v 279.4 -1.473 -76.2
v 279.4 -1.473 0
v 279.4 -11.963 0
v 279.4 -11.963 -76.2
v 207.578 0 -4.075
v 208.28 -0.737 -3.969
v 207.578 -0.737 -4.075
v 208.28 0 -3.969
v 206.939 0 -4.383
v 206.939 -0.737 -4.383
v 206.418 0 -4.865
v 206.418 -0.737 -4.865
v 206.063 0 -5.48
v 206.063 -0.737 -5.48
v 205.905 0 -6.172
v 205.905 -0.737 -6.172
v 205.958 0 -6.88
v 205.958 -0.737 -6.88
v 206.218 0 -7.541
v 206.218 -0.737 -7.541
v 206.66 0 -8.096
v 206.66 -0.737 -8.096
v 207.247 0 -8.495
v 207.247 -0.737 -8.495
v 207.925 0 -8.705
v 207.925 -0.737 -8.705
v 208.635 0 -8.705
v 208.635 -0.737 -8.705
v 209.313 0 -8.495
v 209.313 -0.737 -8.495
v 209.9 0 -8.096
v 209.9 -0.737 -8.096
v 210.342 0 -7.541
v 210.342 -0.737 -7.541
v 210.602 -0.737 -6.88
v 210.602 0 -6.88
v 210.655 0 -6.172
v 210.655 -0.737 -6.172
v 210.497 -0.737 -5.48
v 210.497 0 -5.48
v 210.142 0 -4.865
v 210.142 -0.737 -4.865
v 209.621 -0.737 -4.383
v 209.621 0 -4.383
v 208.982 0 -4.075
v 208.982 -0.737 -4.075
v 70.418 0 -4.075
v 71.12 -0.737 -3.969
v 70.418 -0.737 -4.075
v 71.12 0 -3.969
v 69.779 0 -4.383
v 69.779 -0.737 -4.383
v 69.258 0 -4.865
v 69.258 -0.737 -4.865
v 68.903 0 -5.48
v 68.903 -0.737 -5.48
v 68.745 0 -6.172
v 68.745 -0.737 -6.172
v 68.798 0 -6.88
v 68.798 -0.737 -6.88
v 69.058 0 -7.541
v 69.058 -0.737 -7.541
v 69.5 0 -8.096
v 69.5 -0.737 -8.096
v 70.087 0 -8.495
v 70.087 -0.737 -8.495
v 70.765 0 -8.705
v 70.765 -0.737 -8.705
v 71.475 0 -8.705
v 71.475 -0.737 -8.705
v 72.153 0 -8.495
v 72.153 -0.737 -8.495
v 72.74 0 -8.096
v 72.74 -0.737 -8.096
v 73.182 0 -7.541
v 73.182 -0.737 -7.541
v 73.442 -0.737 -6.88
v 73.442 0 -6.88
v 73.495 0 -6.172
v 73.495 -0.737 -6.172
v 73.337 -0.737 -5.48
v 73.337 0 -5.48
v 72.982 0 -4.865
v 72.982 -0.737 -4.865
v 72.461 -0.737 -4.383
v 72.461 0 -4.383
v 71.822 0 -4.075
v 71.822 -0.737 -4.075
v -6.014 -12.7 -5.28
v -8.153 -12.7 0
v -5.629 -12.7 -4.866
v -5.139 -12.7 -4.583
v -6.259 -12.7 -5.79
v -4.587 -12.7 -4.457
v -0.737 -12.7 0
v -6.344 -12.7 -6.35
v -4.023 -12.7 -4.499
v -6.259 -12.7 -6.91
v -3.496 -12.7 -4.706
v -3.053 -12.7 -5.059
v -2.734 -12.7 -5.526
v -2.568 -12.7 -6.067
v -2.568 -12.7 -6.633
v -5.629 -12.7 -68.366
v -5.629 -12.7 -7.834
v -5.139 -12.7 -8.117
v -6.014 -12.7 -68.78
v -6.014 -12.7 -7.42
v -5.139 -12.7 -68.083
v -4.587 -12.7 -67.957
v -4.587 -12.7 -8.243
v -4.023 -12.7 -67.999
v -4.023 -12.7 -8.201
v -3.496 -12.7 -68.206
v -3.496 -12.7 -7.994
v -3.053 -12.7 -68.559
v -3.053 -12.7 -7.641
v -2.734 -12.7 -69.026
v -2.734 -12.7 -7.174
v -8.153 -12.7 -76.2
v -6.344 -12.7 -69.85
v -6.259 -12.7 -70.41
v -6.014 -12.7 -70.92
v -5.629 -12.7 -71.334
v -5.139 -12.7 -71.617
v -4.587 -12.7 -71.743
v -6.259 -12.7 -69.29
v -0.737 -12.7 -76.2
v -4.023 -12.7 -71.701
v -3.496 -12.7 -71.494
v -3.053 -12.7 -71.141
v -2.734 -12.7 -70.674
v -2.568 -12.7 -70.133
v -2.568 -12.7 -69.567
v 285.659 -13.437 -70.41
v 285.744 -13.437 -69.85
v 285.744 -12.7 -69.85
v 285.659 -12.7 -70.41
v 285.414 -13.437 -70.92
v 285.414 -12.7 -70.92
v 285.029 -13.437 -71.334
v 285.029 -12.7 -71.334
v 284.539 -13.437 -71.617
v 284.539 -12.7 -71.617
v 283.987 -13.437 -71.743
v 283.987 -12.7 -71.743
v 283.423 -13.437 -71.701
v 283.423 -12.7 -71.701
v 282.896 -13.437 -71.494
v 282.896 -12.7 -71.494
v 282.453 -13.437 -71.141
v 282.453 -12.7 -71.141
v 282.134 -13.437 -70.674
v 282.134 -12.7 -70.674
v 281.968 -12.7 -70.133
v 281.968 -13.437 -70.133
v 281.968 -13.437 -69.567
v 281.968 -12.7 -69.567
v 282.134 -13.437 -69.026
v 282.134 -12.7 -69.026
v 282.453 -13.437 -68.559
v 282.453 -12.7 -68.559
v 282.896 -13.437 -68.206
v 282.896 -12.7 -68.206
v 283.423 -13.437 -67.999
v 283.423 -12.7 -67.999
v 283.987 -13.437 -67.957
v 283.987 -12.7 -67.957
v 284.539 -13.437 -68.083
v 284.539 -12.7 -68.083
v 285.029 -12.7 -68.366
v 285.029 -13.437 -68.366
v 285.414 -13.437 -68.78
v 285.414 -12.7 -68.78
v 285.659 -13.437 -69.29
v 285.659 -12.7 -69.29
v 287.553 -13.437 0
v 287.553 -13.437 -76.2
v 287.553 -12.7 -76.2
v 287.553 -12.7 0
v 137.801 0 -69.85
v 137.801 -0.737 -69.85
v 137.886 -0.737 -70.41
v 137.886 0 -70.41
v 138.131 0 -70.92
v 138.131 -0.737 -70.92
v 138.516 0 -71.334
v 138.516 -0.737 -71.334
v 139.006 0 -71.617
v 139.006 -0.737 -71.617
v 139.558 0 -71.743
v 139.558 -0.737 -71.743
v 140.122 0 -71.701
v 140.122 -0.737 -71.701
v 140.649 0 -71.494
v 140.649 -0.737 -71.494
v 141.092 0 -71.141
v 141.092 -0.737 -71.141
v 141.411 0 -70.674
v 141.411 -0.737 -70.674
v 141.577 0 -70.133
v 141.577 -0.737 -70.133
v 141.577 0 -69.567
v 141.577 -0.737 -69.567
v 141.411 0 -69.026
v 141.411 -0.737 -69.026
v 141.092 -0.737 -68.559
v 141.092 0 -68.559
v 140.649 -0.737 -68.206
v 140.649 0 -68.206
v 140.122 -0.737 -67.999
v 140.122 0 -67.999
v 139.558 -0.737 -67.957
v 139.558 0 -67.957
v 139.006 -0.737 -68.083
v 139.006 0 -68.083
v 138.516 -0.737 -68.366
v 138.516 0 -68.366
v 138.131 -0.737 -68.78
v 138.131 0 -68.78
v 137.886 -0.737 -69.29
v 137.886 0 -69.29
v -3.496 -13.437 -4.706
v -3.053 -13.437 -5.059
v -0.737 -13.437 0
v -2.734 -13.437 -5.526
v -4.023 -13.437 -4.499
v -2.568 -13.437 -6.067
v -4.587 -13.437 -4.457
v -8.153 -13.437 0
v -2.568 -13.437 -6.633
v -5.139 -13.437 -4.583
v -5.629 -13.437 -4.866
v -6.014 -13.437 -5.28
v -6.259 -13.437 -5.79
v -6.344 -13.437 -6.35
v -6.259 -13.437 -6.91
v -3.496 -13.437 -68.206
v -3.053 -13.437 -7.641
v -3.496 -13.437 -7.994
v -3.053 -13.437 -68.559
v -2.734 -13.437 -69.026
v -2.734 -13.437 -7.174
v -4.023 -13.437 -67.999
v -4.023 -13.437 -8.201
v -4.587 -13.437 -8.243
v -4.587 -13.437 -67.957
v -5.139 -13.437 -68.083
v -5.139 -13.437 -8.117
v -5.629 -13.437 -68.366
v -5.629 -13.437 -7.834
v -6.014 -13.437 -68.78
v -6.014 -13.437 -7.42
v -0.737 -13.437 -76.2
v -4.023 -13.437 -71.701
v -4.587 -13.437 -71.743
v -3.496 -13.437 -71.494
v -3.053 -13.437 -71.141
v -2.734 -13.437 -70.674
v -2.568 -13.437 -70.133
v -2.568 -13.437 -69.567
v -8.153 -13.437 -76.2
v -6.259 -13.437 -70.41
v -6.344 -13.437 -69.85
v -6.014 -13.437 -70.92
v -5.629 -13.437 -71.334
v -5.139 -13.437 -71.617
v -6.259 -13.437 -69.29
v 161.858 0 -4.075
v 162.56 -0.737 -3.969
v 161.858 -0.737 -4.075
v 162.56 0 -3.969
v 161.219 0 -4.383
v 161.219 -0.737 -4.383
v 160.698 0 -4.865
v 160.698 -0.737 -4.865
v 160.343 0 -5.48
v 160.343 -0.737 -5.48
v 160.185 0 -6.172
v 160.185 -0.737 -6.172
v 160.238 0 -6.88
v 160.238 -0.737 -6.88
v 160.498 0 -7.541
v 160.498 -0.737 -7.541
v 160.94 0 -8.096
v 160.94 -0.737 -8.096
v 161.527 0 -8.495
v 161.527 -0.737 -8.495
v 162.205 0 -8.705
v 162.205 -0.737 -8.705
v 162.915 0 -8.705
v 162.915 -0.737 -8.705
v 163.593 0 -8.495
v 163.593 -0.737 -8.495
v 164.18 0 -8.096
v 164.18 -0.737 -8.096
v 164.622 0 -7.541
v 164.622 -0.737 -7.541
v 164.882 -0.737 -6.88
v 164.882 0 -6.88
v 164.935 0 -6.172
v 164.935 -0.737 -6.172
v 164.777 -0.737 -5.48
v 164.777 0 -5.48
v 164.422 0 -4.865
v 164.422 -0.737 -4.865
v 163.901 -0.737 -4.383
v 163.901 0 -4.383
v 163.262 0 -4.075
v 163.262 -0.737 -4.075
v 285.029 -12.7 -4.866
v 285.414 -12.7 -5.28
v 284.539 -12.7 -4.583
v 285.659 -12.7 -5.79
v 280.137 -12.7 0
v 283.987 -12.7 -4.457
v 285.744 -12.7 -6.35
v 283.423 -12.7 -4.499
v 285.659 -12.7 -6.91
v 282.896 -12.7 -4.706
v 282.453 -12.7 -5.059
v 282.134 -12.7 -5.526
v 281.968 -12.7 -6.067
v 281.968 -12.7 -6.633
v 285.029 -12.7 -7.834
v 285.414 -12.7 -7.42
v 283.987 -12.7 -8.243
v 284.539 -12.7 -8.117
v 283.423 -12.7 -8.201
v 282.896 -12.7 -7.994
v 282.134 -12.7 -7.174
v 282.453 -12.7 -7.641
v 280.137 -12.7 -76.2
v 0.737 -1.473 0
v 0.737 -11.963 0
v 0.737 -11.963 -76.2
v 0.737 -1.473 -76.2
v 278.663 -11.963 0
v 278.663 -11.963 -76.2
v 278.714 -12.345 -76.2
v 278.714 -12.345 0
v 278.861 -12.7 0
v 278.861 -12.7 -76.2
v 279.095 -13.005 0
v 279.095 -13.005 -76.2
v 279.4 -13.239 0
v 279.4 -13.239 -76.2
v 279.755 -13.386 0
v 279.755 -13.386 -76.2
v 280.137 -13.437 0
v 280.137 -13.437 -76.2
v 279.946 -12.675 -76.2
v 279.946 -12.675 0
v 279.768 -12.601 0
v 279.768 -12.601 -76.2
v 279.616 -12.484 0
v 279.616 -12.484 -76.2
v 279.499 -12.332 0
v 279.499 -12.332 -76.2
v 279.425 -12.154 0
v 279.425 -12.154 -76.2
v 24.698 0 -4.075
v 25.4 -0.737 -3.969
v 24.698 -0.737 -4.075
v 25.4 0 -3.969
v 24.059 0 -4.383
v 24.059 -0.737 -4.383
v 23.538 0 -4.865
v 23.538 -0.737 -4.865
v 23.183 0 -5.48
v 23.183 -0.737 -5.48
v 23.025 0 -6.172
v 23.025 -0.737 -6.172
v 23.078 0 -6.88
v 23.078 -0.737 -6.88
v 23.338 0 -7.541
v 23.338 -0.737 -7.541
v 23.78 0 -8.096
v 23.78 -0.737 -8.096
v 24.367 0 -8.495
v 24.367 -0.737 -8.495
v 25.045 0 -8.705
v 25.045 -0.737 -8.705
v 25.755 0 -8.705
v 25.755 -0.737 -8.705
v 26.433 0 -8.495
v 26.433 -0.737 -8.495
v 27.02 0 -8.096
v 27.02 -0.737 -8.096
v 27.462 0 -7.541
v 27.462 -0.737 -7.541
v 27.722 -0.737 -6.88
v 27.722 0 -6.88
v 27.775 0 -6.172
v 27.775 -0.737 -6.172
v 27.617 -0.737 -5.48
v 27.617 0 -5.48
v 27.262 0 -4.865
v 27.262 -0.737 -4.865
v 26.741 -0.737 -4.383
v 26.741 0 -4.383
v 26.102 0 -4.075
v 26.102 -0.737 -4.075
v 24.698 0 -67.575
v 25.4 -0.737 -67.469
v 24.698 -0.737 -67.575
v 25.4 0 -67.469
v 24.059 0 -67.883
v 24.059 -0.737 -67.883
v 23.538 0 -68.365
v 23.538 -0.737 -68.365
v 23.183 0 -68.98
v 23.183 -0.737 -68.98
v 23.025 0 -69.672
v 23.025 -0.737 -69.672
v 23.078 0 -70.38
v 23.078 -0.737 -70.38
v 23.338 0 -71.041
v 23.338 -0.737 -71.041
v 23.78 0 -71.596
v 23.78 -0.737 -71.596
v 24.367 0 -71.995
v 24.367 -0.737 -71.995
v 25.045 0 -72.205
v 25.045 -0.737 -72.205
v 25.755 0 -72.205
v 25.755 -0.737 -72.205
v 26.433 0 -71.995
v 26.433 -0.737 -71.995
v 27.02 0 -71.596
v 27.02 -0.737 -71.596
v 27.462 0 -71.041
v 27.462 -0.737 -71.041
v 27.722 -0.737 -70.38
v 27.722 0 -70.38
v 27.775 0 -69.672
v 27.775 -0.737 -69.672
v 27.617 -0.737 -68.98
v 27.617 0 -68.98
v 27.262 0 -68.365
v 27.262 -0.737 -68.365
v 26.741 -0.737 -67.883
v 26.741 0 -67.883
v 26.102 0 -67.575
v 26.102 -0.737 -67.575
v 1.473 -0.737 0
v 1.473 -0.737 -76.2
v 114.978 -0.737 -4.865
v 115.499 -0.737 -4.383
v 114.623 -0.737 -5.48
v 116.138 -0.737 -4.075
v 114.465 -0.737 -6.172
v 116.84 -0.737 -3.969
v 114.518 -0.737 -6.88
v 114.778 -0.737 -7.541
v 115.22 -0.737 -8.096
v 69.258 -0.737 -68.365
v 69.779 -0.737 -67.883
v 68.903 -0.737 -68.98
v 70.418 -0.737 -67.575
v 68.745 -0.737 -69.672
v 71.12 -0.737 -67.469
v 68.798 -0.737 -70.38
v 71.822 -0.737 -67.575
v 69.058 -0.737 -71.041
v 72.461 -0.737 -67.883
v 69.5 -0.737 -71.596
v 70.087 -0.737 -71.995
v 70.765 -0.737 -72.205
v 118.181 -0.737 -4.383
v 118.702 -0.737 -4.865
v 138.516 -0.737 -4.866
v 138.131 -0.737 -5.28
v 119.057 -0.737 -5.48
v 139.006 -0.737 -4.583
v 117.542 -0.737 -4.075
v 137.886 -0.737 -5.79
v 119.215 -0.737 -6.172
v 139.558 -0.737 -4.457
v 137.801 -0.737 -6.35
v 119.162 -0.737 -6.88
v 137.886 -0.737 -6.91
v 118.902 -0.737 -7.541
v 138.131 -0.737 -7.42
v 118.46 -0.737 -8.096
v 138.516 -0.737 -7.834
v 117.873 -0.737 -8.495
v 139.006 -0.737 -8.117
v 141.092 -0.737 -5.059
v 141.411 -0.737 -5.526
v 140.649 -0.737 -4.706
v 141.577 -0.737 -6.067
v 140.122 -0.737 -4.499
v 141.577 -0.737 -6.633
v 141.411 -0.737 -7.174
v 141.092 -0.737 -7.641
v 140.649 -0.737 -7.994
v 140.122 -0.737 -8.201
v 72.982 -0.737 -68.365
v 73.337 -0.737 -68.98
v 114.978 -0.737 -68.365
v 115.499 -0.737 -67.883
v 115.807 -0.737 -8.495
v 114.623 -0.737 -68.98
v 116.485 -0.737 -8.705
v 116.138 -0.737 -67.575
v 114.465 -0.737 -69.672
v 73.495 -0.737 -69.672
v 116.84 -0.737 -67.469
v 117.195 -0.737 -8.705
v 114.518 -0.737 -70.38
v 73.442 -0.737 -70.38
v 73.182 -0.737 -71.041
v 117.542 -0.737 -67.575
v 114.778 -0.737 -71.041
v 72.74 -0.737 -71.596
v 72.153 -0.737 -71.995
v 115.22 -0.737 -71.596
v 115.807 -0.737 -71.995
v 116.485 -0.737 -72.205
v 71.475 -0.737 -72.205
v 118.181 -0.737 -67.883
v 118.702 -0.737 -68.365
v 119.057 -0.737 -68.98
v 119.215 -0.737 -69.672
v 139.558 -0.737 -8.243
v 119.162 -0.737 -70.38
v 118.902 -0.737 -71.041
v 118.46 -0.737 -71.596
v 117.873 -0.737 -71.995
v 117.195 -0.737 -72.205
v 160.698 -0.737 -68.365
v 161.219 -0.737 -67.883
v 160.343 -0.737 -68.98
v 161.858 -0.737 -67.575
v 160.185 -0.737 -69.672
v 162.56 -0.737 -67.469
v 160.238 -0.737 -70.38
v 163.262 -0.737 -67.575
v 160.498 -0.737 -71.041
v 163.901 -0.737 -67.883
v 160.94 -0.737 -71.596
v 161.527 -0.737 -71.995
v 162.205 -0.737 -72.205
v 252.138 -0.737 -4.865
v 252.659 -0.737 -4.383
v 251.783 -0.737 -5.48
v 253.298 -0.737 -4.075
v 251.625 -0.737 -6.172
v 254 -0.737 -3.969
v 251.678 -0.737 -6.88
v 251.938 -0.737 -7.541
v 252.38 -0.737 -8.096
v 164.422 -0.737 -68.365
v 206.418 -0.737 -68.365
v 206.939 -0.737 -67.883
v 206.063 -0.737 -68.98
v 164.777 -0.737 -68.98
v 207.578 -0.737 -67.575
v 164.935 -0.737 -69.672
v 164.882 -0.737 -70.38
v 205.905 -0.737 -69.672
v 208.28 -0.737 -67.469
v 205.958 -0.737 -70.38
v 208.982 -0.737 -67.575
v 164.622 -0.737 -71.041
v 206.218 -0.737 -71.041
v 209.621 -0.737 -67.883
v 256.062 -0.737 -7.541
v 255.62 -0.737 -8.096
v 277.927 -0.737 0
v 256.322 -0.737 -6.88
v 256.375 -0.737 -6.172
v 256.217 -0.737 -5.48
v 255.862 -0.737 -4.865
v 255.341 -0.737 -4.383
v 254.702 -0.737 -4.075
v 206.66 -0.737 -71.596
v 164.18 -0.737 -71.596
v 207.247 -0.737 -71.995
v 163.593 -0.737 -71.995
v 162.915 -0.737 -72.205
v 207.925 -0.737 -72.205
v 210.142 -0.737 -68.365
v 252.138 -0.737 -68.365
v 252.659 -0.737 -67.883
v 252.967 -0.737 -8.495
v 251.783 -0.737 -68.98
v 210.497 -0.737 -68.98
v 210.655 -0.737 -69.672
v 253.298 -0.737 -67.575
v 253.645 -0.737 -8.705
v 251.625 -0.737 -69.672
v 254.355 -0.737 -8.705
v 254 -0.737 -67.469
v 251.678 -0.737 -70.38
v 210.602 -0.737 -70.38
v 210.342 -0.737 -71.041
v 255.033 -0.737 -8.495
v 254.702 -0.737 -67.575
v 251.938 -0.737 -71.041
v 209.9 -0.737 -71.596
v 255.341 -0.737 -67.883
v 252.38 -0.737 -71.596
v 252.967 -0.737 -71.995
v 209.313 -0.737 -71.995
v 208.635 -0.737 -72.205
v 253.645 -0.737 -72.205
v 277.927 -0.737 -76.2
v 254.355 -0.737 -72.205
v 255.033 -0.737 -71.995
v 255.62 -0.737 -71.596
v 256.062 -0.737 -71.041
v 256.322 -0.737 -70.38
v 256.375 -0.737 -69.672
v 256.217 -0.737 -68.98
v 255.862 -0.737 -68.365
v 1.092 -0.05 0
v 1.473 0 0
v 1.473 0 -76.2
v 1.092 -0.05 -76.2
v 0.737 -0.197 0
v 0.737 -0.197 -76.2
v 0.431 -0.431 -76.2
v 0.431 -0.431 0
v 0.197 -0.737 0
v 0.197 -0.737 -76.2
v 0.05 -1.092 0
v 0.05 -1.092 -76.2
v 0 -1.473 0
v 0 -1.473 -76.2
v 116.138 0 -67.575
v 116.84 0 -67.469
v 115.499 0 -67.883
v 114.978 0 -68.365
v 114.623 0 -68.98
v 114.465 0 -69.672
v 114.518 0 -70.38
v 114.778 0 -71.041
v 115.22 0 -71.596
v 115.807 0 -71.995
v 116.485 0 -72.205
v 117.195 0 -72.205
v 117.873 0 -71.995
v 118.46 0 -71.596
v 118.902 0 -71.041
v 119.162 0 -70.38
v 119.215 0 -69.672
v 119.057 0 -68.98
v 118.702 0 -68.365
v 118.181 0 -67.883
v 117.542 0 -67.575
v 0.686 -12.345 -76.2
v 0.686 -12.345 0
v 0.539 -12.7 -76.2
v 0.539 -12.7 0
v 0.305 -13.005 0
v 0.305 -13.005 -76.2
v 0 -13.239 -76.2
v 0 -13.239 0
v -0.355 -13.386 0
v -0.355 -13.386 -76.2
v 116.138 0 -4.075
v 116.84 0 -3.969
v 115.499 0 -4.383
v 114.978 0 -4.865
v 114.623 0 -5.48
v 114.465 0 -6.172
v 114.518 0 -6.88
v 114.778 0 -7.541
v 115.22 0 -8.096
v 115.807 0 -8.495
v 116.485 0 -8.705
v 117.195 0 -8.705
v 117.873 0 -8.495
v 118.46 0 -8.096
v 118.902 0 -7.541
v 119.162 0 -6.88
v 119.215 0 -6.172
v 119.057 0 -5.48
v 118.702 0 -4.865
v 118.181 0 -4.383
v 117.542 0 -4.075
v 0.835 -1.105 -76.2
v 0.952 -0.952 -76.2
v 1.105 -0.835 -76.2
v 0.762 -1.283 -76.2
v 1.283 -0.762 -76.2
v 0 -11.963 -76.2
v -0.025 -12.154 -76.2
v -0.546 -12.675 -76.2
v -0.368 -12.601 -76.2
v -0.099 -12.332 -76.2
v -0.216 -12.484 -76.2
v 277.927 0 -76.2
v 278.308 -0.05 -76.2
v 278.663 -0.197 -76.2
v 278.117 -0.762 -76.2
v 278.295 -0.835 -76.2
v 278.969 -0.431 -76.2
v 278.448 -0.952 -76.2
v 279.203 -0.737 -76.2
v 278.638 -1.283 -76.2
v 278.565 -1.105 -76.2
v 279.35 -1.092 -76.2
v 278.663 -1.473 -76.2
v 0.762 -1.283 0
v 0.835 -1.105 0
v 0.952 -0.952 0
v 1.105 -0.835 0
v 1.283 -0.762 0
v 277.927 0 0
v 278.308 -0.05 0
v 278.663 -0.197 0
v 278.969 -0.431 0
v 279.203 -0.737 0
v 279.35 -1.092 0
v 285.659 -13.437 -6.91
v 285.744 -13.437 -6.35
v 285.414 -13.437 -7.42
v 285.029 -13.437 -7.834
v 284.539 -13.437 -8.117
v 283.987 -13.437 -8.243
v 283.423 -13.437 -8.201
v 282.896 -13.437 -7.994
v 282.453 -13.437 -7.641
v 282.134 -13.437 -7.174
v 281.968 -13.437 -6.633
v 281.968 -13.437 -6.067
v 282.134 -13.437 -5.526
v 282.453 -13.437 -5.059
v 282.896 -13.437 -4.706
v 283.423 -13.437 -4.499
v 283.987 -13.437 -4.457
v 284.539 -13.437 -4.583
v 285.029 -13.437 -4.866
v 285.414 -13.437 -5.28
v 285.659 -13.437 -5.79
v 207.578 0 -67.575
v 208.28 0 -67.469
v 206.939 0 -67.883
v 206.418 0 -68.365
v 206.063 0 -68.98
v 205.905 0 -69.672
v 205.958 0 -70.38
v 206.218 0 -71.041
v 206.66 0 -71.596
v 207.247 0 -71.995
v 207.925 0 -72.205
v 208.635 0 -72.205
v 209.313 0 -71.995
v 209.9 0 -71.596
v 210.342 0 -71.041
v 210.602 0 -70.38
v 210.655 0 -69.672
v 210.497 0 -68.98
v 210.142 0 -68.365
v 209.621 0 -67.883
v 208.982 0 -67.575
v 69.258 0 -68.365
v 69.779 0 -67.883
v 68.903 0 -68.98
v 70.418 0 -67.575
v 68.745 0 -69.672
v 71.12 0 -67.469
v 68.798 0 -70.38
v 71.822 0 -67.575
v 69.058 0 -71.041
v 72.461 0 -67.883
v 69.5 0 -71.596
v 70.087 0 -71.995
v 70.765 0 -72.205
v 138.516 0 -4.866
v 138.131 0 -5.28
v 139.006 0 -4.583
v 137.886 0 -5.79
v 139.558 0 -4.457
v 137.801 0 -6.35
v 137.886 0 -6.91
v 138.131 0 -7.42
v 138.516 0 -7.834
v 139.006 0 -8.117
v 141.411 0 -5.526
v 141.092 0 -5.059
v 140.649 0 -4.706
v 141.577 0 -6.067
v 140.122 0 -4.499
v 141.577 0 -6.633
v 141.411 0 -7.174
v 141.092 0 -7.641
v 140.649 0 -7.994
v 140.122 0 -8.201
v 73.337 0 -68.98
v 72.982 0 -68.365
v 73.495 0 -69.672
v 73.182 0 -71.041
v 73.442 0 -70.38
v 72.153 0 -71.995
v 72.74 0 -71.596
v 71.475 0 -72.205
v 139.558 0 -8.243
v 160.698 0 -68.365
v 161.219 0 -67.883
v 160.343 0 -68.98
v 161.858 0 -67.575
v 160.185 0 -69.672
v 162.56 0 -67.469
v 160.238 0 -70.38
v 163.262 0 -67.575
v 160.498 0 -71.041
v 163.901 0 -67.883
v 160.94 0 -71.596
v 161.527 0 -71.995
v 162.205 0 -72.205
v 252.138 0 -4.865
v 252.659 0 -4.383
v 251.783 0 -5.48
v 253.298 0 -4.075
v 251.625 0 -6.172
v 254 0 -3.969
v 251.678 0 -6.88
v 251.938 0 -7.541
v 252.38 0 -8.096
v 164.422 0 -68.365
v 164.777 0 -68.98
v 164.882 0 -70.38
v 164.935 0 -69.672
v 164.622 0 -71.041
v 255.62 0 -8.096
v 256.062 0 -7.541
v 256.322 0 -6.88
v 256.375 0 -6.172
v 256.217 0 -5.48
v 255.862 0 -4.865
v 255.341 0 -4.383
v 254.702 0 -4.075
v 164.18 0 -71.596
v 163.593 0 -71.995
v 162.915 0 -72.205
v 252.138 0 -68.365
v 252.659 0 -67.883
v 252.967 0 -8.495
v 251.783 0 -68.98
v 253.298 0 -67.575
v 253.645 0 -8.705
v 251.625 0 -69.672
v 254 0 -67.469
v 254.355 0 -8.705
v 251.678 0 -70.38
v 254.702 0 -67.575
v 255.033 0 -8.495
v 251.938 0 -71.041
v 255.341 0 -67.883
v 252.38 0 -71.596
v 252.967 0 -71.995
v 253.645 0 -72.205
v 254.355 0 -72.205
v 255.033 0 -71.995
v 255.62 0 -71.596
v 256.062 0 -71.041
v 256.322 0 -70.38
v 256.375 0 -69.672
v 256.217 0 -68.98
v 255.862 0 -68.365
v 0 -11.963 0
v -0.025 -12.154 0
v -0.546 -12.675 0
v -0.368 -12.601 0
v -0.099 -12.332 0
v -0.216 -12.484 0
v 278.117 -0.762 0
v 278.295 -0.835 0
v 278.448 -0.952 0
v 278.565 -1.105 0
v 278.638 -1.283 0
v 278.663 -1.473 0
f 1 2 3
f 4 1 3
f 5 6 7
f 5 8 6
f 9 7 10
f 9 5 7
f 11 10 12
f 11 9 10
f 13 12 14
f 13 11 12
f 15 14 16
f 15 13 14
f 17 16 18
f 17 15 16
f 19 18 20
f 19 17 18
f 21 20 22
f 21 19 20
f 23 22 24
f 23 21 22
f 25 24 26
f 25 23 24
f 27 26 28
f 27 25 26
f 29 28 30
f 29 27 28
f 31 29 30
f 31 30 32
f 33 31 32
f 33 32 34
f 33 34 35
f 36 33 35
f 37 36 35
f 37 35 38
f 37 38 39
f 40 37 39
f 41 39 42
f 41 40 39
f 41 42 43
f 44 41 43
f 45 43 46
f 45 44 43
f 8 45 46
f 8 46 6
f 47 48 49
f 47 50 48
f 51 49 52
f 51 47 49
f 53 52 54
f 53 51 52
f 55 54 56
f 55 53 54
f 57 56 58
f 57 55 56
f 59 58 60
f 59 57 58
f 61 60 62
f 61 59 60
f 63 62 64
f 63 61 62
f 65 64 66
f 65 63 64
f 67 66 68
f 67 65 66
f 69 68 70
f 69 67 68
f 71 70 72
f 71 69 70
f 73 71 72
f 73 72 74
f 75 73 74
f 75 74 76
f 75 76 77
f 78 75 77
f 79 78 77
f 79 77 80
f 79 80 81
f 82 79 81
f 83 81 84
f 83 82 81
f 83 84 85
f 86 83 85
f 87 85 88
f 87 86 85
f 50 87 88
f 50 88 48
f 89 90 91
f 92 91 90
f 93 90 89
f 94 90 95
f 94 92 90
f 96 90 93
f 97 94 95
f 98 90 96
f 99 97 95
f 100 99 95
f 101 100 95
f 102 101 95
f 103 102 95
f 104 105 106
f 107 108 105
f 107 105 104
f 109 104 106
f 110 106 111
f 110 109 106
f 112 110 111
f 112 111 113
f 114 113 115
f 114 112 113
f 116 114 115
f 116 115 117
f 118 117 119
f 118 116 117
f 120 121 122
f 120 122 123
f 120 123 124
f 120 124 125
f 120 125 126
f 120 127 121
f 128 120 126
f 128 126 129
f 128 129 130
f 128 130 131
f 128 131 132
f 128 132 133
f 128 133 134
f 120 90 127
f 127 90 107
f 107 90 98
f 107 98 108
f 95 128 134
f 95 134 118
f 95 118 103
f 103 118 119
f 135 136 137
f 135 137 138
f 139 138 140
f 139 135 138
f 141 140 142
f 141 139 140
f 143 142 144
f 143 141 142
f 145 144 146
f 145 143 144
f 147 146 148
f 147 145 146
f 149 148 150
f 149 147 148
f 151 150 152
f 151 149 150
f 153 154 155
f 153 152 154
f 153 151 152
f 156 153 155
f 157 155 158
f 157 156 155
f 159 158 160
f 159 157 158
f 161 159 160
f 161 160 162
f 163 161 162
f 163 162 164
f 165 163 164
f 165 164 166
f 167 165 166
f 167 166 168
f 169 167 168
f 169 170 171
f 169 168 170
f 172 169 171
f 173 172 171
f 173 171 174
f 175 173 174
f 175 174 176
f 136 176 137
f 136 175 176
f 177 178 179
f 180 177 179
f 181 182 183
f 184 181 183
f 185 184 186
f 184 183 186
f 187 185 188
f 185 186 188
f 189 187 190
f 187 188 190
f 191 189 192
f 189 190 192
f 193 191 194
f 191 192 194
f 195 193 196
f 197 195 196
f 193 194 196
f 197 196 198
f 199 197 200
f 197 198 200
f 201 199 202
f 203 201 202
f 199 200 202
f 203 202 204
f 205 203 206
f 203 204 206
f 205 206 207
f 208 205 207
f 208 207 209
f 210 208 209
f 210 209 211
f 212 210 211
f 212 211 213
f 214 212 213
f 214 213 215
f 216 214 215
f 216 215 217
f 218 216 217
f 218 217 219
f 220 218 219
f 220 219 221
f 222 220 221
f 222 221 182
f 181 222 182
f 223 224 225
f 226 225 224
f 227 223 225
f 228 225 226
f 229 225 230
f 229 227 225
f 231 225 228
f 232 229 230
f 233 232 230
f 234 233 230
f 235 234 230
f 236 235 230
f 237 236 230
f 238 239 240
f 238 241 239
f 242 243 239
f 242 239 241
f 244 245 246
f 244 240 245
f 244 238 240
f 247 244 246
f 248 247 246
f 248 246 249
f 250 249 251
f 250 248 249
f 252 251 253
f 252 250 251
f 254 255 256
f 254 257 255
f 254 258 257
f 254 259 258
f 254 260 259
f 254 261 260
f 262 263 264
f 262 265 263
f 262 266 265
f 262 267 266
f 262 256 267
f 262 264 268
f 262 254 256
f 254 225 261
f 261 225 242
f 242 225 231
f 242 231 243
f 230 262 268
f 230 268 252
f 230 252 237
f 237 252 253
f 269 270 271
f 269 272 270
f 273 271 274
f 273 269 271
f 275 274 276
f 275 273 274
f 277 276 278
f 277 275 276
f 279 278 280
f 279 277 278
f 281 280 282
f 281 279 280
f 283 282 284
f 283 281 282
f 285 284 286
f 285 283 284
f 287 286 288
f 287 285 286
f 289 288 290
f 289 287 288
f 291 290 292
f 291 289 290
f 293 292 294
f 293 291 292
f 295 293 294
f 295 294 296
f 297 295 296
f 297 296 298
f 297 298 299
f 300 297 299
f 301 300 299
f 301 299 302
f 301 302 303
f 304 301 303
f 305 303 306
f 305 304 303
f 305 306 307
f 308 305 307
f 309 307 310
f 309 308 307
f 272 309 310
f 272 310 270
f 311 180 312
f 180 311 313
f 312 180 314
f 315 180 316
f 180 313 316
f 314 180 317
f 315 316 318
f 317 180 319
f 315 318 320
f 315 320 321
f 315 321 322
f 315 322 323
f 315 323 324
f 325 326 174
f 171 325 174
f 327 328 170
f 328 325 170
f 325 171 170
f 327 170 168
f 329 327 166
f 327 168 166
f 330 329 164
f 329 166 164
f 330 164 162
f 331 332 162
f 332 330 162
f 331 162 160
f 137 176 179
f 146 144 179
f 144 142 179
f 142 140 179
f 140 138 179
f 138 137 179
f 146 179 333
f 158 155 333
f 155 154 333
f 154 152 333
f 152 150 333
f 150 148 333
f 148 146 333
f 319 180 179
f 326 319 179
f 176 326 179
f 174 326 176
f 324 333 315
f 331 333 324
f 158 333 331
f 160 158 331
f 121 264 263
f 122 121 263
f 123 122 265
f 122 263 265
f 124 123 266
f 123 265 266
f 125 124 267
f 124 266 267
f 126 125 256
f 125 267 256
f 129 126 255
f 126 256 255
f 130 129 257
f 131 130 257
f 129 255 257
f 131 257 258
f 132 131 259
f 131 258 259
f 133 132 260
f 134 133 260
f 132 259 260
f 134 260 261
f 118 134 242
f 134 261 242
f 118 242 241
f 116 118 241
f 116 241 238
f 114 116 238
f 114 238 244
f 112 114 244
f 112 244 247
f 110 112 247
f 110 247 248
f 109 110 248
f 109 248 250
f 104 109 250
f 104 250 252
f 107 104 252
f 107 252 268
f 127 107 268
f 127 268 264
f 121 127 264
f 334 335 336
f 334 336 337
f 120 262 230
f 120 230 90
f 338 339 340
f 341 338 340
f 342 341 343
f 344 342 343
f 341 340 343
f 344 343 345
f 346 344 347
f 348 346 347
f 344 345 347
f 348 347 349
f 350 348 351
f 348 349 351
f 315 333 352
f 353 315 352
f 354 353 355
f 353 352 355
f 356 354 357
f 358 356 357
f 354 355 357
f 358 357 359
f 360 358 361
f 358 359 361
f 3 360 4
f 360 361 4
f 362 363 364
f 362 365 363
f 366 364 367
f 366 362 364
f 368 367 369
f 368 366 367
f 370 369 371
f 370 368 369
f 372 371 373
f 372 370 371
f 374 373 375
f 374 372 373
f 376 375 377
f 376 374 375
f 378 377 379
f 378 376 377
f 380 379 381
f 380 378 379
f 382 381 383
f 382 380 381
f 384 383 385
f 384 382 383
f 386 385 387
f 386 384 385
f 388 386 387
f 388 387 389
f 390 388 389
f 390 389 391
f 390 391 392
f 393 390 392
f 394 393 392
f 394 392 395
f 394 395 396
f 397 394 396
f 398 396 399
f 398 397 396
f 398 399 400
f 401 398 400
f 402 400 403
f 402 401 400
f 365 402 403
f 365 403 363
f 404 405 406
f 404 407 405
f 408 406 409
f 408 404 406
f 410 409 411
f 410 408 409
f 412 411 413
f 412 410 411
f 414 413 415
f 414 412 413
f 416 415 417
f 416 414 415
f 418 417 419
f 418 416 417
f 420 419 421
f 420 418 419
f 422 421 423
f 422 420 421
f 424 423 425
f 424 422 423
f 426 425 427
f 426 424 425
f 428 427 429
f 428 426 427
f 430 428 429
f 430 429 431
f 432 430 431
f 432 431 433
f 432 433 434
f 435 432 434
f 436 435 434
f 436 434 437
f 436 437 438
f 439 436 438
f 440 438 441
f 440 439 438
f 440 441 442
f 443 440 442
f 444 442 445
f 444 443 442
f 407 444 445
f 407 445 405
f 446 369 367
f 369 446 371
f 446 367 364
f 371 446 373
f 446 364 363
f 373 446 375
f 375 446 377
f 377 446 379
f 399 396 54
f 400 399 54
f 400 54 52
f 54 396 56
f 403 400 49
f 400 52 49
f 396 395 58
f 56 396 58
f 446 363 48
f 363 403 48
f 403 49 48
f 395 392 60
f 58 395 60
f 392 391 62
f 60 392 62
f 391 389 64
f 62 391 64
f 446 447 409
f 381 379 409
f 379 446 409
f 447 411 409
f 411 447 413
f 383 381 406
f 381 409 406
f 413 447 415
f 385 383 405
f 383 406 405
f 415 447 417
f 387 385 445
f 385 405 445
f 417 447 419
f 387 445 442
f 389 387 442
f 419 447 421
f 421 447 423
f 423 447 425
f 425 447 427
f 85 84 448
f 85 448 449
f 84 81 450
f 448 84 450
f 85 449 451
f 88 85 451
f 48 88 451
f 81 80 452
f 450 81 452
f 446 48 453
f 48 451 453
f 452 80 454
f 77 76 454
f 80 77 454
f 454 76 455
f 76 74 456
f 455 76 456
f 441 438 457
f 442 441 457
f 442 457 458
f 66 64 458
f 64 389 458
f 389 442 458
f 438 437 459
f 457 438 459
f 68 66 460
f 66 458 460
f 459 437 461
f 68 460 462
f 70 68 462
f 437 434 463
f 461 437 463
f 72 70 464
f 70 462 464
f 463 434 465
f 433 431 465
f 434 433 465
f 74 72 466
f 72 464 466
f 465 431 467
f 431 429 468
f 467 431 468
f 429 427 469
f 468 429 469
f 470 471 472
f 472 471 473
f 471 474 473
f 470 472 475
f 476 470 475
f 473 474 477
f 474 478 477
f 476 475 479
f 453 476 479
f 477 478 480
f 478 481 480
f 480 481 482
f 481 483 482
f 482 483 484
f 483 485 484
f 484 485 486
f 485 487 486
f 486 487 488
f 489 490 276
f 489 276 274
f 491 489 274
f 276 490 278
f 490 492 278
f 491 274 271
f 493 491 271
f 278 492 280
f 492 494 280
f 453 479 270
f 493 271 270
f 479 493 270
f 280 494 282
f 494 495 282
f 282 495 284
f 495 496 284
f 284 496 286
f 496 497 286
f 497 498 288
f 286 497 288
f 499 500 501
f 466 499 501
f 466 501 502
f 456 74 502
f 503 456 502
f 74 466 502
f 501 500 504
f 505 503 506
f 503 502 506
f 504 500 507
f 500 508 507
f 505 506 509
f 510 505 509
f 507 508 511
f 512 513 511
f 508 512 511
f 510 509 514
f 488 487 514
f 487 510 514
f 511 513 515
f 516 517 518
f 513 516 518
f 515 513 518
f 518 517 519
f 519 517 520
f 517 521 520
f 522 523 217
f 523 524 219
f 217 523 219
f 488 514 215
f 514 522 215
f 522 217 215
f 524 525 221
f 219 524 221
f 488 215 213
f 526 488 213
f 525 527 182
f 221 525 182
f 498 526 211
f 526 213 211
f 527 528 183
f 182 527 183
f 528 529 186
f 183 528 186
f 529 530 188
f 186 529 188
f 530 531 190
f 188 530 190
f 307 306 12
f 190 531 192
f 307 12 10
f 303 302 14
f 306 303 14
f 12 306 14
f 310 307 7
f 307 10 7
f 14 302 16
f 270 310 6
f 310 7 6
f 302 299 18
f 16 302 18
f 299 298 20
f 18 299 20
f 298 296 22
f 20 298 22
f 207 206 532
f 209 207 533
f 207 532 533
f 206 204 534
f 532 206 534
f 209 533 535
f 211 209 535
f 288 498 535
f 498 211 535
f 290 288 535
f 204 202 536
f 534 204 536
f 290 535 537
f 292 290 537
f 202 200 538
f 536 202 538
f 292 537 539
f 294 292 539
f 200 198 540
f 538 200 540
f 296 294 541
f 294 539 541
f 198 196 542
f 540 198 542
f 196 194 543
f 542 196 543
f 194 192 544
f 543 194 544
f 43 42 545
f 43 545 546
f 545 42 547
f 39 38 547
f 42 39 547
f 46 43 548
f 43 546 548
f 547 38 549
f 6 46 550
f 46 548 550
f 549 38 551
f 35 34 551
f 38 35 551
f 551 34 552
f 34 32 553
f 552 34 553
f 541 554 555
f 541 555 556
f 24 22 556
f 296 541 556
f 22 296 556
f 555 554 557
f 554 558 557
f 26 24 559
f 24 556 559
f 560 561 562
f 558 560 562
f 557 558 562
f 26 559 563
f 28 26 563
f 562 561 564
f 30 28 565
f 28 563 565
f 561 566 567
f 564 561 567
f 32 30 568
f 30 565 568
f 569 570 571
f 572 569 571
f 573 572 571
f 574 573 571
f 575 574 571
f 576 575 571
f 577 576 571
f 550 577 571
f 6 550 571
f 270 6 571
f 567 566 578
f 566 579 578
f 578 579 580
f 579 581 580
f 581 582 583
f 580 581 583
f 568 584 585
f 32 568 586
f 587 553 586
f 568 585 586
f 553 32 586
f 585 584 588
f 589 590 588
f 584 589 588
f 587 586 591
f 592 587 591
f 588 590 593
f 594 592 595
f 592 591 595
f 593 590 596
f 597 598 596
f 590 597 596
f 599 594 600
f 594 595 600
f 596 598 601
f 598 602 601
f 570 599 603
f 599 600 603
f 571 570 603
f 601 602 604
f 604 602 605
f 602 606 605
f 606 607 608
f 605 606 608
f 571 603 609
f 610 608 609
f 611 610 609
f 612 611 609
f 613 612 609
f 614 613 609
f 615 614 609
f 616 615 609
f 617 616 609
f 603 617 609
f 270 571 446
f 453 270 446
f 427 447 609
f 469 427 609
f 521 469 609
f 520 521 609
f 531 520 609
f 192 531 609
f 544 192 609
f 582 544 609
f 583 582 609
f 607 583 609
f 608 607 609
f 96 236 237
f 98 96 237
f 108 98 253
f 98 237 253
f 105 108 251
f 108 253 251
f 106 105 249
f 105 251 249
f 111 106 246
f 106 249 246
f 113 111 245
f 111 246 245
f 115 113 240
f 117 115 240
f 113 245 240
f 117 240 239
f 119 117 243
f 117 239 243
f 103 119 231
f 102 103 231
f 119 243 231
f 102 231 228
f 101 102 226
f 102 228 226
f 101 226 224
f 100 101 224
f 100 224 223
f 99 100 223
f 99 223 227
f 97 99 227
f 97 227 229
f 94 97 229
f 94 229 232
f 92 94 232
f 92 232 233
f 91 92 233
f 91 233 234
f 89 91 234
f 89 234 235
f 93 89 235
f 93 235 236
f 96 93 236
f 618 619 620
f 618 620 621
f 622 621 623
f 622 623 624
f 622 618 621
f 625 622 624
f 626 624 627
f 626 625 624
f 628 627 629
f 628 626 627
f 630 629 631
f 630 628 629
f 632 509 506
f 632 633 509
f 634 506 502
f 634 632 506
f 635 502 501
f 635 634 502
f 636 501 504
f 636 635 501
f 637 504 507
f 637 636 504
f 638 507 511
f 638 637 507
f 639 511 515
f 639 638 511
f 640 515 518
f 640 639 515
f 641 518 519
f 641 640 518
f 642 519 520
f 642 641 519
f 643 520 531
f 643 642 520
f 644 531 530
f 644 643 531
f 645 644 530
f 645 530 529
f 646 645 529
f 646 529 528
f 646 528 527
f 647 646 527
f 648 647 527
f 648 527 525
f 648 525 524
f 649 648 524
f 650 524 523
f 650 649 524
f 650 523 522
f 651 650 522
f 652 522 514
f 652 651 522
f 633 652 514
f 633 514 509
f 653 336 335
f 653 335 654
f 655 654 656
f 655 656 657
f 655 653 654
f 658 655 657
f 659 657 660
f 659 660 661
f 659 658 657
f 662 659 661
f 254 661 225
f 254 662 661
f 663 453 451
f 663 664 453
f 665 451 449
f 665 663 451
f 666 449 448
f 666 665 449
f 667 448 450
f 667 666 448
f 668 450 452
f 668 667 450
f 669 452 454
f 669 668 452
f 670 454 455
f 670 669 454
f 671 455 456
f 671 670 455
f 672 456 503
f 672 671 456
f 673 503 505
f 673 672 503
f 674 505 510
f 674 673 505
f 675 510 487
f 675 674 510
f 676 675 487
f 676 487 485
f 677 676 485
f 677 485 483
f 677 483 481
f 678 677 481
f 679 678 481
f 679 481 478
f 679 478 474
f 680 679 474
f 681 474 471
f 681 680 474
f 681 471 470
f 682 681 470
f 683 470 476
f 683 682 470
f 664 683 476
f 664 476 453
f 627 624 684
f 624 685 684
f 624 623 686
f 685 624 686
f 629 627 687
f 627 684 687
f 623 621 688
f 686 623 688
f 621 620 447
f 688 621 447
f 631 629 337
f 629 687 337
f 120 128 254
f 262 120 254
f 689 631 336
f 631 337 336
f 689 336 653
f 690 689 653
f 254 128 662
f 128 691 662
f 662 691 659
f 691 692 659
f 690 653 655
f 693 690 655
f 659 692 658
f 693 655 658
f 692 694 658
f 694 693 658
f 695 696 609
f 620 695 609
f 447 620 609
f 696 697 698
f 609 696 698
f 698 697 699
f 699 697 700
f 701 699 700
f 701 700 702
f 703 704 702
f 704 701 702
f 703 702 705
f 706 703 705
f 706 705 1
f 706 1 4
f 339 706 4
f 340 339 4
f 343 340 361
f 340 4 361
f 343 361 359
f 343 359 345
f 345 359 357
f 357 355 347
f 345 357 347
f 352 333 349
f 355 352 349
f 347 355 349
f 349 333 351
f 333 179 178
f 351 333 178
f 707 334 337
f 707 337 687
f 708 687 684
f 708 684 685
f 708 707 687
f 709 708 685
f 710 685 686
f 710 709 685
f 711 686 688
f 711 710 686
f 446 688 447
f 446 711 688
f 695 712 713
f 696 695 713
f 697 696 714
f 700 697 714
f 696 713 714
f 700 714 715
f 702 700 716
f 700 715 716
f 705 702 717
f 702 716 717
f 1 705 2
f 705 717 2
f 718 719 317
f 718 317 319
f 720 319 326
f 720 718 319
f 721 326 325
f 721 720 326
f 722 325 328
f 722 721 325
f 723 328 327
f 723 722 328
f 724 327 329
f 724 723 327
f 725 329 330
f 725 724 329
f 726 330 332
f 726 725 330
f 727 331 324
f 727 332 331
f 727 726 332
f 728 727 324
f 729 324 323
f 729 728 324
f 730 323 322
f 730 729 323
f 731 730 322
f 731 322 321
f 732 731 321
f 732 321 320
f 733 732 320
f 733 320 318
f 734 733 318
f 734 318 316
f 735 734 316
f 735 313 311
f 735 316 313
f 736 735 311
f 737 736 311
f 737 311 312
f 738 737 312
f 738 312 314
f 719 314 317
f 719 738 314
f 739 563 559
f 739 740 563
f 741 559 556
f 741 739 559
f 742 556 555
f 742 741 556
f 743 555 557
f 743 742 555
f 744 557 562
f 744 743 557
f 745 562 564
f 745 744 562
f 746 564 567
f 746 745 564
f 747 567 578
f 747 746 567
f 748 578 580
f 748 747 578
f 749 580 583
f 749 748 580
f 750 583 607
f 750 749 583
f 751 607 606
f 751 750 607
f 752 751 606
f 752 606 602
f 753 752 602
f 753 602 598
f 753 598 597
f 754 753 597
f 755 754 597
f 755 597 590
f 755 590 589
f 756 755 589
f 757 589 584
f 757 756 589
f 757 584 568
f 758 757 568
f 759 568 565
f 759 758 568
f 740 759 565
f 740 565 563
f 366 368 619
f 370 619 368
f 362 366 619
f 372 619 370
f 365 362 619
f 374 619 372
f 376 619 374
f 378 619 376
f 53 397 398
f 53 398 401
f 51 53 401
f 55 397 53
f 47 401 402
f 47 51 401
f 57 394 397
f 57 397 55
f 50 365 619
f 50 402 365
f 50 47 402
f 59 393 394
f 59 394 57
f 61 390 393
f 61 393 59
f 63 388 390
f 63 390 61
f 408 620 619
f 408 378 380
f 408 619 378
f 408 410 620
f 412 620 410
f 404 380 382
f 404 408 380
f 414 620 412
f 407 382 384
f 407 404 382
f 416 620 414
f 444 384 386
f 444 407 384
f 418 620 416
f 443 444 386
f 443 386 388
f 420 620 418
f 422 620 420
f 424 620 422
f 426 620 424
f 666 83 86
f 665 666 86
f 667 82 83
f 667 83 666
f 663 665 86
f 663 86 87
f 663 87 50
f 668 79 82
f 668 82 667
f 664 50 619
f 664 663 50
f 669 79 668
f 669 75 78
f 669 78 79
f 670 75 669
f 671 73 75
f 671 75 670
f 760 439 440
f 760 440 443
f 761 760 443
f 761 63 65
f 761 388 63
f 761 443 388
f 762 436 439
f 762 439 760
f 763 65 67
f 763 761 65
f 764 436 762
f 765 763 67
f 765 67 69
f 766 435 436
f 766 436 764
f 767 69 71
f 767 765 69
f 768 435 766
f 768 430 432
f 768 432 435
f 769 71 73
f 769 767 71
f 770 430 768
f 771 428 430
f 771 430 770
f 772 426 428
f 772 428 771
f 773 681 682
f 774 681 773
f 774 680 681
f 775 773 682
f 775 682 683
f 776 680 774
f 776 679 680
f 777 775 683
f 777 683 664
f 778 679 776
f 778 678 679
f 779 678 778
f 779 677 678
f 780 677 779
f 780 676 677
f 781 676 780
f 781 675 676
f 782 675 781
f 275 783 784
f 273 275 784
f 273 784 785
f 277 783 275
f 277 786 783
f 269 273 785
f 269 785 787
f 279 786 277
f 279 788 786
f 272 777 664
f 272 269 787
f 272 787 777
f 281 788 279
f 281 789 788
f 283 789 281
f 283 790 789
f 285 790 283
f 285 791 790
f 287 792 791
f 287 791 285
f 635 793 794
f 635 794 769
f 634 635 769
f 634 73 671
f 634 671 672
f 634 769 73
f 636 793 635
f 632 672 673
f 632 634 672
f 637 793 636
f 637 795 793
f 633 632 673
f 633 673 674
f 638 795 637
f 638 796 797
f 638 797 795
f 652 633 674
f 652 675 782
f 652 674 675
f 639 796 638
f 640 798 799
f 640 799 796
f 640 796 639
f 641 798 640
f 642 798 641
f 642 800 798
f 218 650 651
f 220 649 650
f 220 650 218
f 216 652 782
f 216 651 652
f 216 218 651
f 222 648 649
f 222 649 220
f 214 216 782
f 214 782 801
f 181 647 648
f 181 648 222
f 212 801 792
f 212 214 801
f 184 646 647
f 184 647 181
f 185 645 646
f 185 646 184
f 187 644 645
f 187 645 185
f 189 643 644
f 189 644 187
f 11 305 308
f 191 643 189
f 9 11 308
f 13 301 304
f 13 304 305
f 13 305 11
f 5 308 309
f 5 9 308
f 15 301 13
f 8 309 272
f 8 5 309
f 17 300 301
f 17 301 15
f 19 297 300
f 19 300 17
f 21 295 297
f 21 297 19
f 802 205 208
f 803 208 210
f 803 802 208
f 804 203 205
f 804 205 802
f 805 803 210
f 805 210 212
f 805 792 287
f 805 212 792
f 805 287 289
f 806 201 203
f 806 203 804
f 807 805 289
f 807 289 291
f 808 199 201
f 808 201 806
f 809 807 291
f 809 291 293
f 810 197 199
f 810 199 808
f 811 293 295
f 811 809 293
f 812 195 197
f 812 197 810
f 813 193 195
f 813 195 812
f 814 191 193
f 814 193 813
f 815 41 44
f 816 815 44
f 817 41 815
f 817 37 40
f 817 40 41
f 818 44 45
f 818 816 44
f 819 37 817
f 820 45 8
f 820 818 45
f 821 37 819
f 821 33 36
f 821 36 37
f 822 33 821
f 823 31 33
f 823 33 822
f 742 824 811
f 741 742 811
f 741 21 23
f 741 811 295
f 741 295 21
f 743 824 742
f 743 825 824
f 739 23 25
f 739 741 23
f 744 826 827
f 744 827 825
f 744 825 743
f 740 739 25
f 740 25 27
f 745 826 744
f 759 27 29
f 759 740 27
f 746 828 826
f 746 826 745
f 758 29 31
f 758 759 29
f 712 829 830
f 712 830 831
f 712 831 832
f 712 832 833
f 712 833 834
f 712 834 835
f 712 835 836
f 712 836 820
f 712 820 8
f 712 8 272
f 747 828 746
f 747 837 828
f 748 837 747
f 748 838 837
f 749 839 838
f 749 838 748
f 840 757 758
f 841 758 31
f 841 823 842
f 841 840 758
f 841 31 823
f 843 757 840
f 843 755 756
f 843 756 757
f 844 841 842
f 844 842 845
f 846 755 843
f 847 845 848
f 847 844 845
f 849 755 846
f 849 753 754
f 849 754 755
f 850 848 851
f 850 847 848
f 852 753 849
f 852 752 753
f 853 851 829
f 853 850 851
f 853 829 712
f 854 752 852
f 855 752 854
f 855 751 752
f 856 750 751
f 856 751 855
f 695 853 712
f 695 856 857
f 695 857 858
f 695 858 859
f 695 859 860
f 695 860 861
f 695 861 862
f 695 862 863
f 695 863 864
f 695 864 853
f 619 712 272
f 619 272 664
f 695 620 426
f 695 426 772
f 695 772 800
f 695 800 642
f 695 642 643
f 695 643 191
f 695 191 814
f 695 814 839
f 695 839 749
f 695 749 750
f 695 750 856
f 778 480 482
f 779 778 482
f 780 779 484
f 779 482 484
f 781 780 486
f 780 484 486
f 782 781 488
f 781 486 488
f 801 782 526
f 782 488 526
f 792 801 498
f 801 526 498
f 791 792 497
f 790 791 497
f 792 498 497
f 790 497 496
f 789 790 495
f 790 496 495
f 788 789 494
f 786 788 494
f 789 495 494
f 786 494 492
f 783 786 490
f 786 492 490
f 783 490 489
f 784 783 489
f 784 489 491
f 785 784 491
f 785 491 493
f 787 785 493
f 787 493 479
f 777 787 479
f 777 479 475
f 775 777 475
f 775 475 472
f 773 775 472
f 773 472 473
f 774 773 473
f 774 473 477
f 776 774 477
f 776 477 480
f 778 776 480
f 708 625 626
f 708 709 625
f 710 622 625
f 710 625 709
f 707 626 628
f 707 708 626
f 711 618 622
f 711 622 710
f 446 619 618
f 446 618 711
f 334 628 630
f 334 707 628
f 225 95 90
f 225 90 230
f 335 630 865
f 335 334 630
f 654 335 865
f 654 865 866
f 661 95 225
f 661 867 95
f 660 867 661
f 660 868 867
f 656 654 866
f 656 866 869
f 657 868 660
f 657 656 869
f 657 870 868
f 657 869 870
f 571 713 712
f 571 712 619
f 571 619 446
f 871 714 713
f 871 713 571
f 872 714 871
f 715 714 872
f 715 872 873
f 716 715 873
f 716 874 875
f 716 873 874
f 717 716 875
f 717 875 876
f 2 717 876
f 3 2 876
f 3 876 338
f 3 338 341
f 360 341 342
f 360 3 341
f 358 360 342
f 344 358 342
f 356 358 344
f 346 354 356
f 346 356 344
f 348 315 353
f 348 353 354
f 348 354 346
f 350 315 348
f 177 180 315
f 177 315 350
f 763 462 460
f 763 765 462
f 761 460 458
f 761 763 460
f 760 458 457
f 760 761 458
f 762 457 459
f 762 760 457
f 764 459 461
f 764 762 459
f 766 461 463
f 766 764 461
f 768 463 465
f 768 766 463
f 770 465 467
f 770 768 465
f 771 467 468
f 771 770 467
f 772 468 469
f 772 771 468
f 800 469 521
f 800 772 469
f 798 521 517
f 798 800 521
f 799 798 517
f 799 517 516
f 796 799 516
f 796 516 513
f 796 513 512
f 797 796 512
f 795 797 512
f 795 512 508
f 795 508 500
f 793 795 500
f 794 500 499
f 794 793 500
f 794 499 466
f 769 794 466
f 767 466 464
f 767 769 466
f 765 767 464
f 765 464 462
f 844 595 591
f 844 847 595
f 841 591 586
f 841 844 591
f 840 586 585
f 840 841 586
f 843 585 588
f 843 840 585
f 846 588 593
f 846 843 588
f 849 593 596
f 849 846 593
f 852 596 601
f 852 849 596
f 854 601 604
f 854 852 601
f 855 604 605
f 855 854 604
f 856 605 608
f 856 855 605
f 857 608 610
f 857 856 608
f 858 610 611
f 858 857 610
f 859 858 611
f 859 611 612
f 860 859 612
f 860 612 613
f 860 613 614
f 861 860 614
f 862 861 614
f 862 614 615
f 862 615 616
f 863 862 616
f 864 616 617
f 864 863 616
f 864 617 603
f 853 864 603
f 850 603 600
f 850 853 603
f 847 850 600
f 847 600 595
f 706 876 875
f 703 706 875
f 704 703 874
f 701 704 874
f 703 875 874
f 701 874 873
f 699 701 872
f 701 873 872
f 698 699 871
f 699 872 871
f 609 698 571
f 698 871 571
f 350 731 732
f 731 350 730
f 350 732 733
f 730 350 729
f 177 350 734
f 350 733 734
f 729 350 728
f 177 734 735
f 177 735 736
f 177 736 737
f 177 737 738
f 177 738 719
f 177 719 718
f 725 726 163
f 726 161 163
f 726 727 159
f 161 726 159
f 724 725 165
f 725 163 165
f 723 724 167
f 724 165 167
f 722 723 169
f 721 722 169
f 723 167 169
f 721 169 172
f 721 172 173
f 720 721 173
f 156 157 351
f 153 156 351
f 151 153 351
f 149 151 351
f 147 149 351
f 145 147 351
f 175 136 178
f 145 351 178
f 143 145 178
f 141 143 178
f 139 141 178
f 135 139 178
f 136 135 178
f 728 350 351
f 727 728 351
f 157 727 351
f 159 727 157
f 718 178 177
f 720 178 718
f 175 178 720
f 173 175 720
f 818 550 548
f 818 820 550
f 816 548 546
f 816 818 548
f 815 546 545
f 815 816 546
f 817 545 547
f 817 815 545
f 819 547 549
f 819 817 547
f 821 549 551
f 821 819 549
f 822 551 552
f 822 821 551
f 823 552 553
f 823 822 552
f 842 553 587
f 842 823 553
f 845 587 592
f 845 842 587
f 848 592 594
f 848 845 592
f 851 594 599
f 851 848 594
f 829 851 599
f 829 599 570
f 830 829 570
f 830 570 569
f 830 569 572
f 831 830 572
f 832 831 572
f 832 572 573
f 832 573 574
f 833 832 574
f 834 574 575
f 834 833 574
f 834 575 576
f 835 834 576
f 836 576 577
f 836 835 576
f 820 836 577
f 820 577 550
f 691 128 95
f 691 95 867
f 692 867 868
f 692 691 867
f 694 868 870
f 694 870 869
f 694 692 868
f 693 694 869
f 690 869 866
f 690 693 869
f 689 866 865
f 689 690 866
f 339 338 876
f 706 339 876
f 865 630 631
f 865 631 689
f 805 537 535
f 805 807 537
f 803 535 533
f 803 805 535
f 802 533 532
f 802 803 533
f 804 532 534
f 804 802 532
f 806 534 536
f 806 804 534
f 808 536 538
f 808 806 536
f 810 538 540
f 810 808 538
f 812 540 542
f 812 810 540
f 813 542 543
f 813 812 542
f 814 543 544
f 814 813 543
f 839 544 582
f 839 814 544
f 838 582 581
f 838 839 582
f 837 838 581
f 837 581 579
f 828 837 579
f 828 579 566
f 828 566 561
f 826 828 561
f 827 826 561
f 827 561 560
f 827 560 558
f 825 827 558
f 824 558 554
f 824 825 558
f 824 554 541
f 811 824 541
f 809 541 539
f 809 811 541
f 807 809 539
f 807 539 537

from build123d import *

# Parameters (mm, degrees)
SKETCH1_W                    = 279.4
SKETCH1_H                    = 76.2
BASE_FLANGE1_DEPTH           = 0.7366
EDGE_FLANGE1_STRIP_W         = 4.4196
EDGE_FLANGE1_STRIP_H         = 0.7366
EDGE_FLANGE1_STRIP_CUT_DEPTH = 76.2
EDGE_FLANGE1_DEPTH           = 76.2
EDGE_FLANGE2_DEPTH           = 76.2
F_6_CLEARANCE_HOLE1_D        = 3.7973
LPATTERN1_COUNT              = 6
LPATTERN1_PITCH              = 45.72
LPATTERN1_COUNT_DIR2         = 2
LPATTERN1_PITCH_DIR2         = 63.5
F_6_CLEARANCE_HOLE2_D        = 3.7973


# Sheet-metal steps are written as plain solids
with BuildPart() as part:
    # Sketch1 → Base-Flange1 (new body)
    with BuildSketch(Plane(origin=(0, 0, 0), x_dir=(1, 0, 0), z_dir=(0, 1, 0))):
        with Locations((139.7, 38.1)):
            Rectangle(SKETCH1_W, SKETCH1_H)
    extrude(amount=-BASE_FLANGE1_DEPTH)

    # Edge-Flange1 strip (across the edge) → Edge-Flange1 strip cut (cut)
    with BuildSketch(Plane(origin=(0, -0.7366, 0), x_dir=(1, 0, 0), z_dir=(0, 0, -1))):
        with Locations((-0.7366, -0.3683)):
            Rectangle(EDGE_FLANGE1_STRIP_W, EDGE_FLANGE1_STRIP_H)
    edge_flange1_strip_cut = extrude(amount=EDGE_FLANGE1_STRIP_CUT_DEPTH, mode=Mode.SUBTRACT)

    # Edge-Flange1 section (across the edge) → Edge-Flange1 (add)
    with BuildSketch(Plane(origin=(0, -0.7366, 0), x_dir=(1, 0, 0), z_dir=(0, 0, -1))):
        with BuildLine():
            Line((0, 0.7366), (0, 11.2268))
            Line((0, 11.2268), (0.7366, 11.2268))
            Line((0.7366, 11.2268), (0.7366, 0.7366))
            ThreePointArc((0.7366, 0.7366), (0.952345145, 0.215745145), (1.4732, 0))
            Line((1.4732, 0), (1.4732, -0.7366))
            ThreePointArc((1.4732, -0.7366), (0.43149029, -0.30510971), (0, 0.7366))
        make_face()
    edge_flange1 = extrude(amount=EDGE_FLANGE1_DEPTH)

    # Edge-Flange2 section (across the edge) → Edge-Flange2 (add)
    with BuildSketch(Plane(origin=(0, -12.7, -76.2), x_dir=(0, 1, 0), z_dir=(0, 0, 1))):
        with BuildLine():
            Line((-0.7366, 0.7366), (-0.7366, 8.1534))
            Line((-0.7366, 8.1534), (0, 8.1534))
            Line((0, 8.1534), (0, 0.7366))
            ThreePointArc((0, 0.7366), (0.215745145, 0.215745145), (0.7366, 0))
            Line((0.7366, 0), (0.7366, -0.7366))
            ThreePointArc((0.7366, -0.7366), (-0.30510971, -0.30510971), (-0.7366, 0.7366))
        make_face()
    edge_flange2 = extrude(amount=EDGE_FLANGE2_DEPTH)

    # Sketch21 → 3/32 (0.09375) Diameter Hole1 (revolve, cut)
    with BuildSketch(Plane(origin=(25.4, 0, -69.85), x_dir=(0, 0, 1), z_dir=(1, 0, 0))):
        Polygon((0, 0), (0, 2.167399349), (2.38125, 0.7366), (2.38125, 0), align=None)
    f_3_32_0_09375_diameter_hole1 = revolve(axis=Axis((25.4, 6.35, -69.85), (0, -1, 0)), mode=Mode.SUBTRACT)

    # #6 Clearance Hole1 (through all)
    with Locations(Plane(origin=(0, -12.7, 0), x_dir=(1, 0, 0), z_dir=(0, 1, 0))):
        with Locations((-4.445, 69.85), (-4.445, 6.35)):
            f_6_clearance_hole1 = Hole(F_6_CLEARANCE_HOLE1_D / 2)

    # LPattern1: 3_32 _0.09375_ Diameter Hole1 6 × 2
    with Locations(*[(i * LPATTERN1_PITCH, 0, j * LPATTERN1_PITCH_DIR2) for i in range(LPATTERN1_COUNT) for j in range(LPATTERN1_COUNT_DIR2) if (i, j) != (0, 0)]):
        add(f_3_32_0_09375_diameter_hole1, mode=Mode.SUBTRACT)

    # Mirror2: Edge-Flange1 strip cut, Edge-Flange1, Edge-Flange2, #6 Clearance Hole1 across plane
    add(edge_flange1_strip_cut.mirror(Plane.ZY.offset(-139.7)), mode=Mode.SUBTRACT)
    add(edge_flange1.mirror(Plane.ZY.offset(-139.7)))
    add(edge_flange2.mirror(Plane.ZY.offset(-139.7)))
    add(f_6_clearance_hole1.mirror(Plane.ZY.offset(-139.7)), mode=Mode.SUBTRACT)

    # #6 Clearance Hole2 (through all)
    with Locations(Plane(origin=(0, 0, 0), x_dir=(1, 0, 0), z_dir=(0, 1, 0))):
        with Locations((139.7, 69.85), (139.7, 6.35)):
            Hole(F_6_CLEARANCE_HOLE2_D / 2)


solid = part.part
